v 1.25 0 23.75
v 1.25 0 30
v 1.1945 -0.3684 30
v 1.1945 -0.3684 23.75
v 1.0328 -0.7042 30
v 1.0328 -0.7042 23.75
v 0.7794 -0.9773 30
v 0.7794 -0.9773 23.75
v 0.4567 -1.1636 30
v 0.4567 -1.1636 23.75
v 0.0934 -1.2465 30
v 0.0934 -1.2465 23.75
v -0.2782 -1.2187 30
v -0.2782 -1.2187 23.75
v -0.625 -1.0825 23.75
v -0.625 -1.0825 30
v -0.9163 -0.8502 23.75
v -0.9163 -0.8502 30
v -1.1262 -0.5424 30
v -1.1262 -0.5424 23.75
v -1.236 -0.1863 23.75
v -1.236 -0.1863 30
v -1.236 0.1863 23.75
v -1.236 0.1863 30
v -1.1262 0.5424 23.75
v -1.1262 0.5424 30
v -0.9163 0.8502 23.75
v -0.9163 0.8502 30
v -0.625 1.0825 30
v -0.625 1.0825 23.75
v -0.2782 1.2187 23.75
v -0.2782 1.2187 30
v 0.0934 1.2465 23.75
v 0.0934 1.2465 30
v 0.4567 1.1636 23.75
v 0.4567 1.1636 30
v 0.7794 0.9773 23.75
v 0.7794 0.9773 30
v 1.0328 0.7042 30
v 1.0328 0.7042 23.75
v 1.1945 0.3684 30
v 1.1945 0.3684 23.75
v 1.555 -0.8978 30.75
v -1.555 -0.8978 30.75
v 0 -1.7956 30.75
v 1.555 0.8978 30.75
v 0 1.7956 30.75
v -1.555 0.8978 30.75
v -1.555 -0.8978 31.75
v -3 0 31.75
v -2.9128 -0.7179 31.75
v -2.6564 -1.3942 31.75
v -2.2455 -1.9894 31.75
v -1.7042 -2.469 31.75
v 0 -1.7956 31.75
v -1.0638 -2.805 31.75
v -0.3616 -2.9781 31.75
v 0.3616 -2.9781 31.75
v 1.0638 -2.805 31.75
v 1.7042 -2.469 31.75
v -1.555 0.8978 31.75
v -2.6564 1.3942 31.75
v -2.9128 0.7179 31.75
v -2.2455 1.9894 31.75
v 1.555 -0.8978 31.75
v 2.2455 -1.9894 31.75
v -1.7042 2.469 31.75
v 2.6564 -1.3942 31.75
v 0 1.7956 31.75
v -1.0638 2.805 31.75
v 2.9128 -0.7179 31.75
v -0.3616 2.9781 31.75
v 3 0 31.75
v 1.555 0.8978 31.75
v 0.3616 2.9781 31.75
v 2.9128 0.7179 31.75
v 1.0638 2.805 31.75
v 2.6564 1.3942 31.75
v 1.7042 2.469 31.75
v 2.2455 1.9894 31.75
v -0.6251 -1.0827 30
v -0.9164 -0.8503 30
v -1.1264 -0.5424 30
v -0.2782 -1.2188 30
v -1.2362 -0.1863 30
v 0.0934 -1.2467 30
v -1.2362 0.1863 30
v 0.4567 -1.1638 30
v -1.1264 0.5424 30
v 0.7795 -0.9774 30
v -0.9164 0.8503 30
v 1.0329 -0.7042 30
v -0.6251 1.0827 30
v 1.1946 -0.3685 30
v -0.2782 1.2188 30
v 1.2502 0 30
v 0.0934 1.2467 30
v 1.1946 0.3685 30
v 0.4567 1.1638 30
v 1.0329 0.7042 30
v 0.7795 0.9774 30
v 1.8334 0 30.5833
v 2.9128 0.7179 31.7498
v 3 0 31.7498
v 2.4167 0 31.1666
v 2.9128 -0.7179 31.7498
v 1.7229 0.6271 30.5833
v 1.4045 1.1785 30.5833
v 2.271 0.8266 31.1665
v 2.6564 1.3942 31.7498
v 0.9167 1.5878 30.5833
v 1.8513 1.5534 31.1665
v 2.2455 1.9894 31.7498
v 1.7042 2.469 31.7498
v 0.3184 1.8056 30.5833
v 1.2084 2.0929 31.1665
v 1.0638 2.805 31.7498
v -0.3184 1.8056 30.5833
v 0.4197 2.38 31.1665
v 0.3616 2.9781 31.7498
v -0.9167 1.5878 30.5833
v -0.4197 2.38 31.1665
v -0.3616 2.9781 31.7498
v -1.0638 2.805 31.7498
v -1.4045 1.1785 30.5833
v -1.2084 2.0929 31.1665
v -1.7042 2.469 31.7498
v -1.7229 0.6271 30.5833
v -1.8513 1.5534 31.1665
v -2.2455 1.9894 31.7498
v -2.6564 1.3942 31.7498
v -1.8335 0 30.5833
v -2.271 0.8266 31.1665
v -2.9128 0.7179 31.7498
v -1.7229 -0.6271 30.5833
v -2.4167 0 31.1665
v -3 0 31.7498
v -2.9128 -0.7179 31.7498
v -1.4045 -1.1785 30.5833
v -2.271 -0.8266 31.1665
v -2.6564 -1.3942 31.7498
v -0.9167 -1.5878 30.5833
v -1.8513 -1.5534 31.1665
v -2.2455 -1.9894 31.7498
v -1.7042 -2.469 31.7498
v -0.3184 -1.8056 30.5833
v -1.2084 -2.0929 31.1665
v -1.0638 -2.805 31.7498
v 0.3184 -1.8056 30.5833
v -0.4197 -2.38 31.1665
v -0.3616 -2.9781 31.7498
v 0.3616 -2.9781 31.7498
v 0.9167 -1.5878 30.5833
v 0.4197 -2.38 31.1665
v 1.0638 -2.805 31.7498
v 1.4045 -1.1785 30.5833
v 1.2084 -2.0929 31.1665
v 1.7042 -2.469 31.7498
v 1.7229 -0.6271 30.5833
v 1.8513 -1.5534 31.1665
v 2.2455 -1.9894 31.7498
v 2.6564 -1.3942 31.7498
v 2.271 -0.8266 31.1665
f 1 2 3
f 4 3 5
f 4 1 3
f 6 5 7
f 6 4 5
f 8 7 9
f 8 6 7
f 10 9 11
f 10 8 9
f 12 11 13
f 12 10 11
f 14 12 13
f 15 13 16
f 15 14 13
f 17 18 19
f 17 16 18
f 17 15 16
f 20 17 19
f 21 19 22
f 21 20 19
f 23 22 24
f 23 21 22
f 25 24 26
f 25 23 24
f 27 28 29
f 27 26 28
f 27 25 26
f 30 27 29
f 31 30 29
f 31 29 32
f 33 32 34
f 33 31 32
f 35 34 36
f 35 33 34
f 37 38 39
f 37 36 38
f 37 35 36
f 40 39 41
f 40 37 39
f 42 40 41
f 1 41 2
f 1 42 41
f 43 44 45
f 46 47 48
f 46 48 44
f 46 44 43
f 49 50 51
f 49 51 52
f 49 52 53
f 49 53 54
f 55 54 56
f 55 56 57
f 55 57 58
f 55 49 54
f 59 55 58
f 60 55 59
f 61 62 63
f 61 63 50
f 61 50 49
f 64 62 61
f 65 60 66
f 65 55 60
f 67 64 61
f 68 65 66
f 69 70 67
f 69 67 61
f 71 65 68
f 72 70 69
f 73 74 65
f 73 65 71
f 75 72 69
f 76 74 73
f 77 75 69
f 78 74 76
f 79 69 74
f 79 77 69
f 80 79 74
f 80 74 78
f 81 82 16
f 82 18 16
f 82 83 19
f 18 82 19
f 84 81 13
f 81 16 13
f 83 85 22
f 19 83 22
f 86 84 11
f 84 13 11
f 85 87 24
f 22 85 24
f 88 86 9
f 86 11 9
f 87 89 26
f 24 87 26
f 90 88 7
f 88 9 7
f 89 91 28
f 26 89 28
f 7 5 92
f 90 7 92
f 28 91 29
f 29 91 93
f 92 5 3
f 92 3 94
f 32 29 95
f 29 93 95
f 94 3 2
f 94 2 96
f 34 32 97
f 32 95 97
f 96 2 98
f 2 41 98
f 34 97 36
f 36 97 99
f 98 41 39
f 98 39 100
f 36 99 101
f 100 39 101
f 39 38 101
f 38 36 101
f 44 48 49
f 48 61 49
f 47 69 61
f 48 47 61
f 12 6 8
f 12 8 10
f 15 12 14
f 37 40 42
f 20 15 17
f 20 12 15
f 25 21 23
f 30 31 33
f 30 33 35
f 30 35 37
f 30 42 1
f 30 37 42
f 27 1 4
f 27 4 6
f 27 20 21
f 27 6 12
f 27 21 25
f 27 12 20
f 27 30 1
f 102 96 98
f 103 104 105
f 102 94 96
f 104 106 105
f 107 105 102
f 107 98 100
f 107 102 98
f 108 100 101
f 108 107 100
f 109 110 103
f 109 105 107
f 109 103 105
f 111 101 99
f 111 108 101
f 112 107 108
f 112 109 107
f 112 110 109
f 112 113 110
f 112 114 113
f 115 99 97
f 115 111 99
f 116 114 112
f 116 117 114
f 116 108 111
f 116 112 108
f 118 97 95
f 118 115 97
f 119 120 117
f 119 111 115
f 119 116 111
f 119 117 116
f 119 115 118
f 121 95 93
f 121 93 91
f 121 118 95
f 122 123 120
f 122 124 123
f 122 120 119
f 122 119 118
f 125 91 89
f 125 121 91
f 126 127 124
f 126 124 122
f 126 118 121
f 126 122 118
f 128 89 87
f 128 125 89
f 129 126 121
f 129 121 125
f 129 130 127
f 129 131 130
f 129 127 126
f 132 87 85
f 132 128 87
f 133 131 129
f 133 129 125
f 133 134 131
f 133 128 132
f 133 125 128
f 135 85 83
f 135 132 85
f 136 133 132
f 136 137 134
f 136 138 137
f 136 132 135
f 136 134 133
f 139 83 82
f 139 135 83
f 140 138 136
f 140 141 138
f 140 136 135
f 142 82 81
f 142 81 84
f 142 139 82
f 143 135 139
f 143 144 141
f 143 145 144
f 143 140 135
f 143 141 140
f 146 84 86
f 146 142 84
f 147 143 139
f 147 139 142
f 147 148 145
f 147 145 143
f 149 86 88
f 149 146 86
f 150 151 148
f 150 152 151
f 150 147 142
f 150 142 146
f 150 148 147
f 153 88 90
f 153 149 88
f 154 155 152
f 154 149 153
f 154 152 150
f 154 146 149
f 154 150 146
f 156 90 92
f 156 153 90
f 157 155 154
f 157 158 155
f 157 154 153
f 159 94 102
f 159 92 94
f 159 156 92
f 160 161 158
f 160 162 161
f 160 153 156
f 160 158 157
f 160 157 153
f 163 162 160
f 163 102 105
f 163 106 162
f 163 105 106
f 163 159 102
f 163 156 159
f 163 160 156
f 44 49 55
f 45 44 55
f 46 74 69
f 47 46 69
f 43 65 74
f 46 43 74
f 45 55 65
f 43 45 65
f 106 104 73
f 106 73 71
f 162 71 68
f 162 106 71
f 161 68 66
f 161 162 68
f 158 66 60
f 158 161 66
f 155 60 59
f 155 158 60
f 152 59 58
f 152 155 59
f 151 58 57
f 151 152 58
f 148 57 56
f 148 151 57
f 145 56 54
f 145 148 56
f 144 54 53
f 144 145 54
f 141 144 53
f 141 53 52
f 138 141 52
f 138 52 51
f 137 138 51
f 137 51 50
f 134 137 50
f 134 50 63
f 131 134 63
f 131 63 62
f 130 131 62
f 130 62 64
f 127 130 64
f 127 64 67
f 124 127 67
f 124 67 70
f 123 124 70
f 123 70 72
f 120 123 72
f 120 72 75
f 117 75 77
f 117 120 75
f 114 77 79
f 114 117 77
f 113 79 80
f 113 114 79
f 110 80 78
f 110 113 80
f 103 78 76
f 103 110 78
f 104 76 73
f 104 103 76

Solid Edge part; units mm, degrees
sketch "Sketch1" plane through (0, 0, 0) normal (0, 0, 1) x (1, 0, 0)
  circle A0 centre (0, 0) radius 1.25
  dimension "D1" = 2.5
extrude "Protrusion1" add sketch "Sketch1" along normal blind 30
sketch "Sketch2" plane through (0, 0, 30) normal (0, 0, 1) x (1, 0, 0)
  circle A0 centre (0, 0) radius 3
extrude "ExtrudedProtrusion_2" add sketch "Sketch2" along normal blind 1.75
chamfer "Chamfer_1" distance 1.75 angle 45 1 edges at (-3, 0, 30)
sketch "Sketch3" plane through (0, 0, 31.75) normal (0, 0, 1) x (0, 1, 0)
  line L0 (0.8978, -1.555) -> (1.7956, 0)
  line L1 (1.7956, 0) -> (0.8978, 1.555)
  line L2 (0.8978, 1.555) -> (-0.8978, 1.555)
  line L3 (-0.8978, 1.555) -> (-1.7956, 0)
  line L4 (-1.7956, 0) -> (-0.8978, -1.555)
  line L5 (-0.8978, -1.555) -> (0.8978, -1.555)
extrude "ExtrudedCutout_1" cut sketch "Sketch3" against normal blind 1
sketch "Sketch4" plane through (0, 0, 0) normal (0, 0, -1) x (0, 1, 0)
  circle A0 centre (0, 0) radius 1.9215
extrude "ExtrudedCutout_2" cut sketch "Sketch4" against normal blind 23.75
revolve "RevolvedCutout1" [suppressed]
fillet "Round_1" [suppressed]
properties material "Iron, grey cast type 20"
